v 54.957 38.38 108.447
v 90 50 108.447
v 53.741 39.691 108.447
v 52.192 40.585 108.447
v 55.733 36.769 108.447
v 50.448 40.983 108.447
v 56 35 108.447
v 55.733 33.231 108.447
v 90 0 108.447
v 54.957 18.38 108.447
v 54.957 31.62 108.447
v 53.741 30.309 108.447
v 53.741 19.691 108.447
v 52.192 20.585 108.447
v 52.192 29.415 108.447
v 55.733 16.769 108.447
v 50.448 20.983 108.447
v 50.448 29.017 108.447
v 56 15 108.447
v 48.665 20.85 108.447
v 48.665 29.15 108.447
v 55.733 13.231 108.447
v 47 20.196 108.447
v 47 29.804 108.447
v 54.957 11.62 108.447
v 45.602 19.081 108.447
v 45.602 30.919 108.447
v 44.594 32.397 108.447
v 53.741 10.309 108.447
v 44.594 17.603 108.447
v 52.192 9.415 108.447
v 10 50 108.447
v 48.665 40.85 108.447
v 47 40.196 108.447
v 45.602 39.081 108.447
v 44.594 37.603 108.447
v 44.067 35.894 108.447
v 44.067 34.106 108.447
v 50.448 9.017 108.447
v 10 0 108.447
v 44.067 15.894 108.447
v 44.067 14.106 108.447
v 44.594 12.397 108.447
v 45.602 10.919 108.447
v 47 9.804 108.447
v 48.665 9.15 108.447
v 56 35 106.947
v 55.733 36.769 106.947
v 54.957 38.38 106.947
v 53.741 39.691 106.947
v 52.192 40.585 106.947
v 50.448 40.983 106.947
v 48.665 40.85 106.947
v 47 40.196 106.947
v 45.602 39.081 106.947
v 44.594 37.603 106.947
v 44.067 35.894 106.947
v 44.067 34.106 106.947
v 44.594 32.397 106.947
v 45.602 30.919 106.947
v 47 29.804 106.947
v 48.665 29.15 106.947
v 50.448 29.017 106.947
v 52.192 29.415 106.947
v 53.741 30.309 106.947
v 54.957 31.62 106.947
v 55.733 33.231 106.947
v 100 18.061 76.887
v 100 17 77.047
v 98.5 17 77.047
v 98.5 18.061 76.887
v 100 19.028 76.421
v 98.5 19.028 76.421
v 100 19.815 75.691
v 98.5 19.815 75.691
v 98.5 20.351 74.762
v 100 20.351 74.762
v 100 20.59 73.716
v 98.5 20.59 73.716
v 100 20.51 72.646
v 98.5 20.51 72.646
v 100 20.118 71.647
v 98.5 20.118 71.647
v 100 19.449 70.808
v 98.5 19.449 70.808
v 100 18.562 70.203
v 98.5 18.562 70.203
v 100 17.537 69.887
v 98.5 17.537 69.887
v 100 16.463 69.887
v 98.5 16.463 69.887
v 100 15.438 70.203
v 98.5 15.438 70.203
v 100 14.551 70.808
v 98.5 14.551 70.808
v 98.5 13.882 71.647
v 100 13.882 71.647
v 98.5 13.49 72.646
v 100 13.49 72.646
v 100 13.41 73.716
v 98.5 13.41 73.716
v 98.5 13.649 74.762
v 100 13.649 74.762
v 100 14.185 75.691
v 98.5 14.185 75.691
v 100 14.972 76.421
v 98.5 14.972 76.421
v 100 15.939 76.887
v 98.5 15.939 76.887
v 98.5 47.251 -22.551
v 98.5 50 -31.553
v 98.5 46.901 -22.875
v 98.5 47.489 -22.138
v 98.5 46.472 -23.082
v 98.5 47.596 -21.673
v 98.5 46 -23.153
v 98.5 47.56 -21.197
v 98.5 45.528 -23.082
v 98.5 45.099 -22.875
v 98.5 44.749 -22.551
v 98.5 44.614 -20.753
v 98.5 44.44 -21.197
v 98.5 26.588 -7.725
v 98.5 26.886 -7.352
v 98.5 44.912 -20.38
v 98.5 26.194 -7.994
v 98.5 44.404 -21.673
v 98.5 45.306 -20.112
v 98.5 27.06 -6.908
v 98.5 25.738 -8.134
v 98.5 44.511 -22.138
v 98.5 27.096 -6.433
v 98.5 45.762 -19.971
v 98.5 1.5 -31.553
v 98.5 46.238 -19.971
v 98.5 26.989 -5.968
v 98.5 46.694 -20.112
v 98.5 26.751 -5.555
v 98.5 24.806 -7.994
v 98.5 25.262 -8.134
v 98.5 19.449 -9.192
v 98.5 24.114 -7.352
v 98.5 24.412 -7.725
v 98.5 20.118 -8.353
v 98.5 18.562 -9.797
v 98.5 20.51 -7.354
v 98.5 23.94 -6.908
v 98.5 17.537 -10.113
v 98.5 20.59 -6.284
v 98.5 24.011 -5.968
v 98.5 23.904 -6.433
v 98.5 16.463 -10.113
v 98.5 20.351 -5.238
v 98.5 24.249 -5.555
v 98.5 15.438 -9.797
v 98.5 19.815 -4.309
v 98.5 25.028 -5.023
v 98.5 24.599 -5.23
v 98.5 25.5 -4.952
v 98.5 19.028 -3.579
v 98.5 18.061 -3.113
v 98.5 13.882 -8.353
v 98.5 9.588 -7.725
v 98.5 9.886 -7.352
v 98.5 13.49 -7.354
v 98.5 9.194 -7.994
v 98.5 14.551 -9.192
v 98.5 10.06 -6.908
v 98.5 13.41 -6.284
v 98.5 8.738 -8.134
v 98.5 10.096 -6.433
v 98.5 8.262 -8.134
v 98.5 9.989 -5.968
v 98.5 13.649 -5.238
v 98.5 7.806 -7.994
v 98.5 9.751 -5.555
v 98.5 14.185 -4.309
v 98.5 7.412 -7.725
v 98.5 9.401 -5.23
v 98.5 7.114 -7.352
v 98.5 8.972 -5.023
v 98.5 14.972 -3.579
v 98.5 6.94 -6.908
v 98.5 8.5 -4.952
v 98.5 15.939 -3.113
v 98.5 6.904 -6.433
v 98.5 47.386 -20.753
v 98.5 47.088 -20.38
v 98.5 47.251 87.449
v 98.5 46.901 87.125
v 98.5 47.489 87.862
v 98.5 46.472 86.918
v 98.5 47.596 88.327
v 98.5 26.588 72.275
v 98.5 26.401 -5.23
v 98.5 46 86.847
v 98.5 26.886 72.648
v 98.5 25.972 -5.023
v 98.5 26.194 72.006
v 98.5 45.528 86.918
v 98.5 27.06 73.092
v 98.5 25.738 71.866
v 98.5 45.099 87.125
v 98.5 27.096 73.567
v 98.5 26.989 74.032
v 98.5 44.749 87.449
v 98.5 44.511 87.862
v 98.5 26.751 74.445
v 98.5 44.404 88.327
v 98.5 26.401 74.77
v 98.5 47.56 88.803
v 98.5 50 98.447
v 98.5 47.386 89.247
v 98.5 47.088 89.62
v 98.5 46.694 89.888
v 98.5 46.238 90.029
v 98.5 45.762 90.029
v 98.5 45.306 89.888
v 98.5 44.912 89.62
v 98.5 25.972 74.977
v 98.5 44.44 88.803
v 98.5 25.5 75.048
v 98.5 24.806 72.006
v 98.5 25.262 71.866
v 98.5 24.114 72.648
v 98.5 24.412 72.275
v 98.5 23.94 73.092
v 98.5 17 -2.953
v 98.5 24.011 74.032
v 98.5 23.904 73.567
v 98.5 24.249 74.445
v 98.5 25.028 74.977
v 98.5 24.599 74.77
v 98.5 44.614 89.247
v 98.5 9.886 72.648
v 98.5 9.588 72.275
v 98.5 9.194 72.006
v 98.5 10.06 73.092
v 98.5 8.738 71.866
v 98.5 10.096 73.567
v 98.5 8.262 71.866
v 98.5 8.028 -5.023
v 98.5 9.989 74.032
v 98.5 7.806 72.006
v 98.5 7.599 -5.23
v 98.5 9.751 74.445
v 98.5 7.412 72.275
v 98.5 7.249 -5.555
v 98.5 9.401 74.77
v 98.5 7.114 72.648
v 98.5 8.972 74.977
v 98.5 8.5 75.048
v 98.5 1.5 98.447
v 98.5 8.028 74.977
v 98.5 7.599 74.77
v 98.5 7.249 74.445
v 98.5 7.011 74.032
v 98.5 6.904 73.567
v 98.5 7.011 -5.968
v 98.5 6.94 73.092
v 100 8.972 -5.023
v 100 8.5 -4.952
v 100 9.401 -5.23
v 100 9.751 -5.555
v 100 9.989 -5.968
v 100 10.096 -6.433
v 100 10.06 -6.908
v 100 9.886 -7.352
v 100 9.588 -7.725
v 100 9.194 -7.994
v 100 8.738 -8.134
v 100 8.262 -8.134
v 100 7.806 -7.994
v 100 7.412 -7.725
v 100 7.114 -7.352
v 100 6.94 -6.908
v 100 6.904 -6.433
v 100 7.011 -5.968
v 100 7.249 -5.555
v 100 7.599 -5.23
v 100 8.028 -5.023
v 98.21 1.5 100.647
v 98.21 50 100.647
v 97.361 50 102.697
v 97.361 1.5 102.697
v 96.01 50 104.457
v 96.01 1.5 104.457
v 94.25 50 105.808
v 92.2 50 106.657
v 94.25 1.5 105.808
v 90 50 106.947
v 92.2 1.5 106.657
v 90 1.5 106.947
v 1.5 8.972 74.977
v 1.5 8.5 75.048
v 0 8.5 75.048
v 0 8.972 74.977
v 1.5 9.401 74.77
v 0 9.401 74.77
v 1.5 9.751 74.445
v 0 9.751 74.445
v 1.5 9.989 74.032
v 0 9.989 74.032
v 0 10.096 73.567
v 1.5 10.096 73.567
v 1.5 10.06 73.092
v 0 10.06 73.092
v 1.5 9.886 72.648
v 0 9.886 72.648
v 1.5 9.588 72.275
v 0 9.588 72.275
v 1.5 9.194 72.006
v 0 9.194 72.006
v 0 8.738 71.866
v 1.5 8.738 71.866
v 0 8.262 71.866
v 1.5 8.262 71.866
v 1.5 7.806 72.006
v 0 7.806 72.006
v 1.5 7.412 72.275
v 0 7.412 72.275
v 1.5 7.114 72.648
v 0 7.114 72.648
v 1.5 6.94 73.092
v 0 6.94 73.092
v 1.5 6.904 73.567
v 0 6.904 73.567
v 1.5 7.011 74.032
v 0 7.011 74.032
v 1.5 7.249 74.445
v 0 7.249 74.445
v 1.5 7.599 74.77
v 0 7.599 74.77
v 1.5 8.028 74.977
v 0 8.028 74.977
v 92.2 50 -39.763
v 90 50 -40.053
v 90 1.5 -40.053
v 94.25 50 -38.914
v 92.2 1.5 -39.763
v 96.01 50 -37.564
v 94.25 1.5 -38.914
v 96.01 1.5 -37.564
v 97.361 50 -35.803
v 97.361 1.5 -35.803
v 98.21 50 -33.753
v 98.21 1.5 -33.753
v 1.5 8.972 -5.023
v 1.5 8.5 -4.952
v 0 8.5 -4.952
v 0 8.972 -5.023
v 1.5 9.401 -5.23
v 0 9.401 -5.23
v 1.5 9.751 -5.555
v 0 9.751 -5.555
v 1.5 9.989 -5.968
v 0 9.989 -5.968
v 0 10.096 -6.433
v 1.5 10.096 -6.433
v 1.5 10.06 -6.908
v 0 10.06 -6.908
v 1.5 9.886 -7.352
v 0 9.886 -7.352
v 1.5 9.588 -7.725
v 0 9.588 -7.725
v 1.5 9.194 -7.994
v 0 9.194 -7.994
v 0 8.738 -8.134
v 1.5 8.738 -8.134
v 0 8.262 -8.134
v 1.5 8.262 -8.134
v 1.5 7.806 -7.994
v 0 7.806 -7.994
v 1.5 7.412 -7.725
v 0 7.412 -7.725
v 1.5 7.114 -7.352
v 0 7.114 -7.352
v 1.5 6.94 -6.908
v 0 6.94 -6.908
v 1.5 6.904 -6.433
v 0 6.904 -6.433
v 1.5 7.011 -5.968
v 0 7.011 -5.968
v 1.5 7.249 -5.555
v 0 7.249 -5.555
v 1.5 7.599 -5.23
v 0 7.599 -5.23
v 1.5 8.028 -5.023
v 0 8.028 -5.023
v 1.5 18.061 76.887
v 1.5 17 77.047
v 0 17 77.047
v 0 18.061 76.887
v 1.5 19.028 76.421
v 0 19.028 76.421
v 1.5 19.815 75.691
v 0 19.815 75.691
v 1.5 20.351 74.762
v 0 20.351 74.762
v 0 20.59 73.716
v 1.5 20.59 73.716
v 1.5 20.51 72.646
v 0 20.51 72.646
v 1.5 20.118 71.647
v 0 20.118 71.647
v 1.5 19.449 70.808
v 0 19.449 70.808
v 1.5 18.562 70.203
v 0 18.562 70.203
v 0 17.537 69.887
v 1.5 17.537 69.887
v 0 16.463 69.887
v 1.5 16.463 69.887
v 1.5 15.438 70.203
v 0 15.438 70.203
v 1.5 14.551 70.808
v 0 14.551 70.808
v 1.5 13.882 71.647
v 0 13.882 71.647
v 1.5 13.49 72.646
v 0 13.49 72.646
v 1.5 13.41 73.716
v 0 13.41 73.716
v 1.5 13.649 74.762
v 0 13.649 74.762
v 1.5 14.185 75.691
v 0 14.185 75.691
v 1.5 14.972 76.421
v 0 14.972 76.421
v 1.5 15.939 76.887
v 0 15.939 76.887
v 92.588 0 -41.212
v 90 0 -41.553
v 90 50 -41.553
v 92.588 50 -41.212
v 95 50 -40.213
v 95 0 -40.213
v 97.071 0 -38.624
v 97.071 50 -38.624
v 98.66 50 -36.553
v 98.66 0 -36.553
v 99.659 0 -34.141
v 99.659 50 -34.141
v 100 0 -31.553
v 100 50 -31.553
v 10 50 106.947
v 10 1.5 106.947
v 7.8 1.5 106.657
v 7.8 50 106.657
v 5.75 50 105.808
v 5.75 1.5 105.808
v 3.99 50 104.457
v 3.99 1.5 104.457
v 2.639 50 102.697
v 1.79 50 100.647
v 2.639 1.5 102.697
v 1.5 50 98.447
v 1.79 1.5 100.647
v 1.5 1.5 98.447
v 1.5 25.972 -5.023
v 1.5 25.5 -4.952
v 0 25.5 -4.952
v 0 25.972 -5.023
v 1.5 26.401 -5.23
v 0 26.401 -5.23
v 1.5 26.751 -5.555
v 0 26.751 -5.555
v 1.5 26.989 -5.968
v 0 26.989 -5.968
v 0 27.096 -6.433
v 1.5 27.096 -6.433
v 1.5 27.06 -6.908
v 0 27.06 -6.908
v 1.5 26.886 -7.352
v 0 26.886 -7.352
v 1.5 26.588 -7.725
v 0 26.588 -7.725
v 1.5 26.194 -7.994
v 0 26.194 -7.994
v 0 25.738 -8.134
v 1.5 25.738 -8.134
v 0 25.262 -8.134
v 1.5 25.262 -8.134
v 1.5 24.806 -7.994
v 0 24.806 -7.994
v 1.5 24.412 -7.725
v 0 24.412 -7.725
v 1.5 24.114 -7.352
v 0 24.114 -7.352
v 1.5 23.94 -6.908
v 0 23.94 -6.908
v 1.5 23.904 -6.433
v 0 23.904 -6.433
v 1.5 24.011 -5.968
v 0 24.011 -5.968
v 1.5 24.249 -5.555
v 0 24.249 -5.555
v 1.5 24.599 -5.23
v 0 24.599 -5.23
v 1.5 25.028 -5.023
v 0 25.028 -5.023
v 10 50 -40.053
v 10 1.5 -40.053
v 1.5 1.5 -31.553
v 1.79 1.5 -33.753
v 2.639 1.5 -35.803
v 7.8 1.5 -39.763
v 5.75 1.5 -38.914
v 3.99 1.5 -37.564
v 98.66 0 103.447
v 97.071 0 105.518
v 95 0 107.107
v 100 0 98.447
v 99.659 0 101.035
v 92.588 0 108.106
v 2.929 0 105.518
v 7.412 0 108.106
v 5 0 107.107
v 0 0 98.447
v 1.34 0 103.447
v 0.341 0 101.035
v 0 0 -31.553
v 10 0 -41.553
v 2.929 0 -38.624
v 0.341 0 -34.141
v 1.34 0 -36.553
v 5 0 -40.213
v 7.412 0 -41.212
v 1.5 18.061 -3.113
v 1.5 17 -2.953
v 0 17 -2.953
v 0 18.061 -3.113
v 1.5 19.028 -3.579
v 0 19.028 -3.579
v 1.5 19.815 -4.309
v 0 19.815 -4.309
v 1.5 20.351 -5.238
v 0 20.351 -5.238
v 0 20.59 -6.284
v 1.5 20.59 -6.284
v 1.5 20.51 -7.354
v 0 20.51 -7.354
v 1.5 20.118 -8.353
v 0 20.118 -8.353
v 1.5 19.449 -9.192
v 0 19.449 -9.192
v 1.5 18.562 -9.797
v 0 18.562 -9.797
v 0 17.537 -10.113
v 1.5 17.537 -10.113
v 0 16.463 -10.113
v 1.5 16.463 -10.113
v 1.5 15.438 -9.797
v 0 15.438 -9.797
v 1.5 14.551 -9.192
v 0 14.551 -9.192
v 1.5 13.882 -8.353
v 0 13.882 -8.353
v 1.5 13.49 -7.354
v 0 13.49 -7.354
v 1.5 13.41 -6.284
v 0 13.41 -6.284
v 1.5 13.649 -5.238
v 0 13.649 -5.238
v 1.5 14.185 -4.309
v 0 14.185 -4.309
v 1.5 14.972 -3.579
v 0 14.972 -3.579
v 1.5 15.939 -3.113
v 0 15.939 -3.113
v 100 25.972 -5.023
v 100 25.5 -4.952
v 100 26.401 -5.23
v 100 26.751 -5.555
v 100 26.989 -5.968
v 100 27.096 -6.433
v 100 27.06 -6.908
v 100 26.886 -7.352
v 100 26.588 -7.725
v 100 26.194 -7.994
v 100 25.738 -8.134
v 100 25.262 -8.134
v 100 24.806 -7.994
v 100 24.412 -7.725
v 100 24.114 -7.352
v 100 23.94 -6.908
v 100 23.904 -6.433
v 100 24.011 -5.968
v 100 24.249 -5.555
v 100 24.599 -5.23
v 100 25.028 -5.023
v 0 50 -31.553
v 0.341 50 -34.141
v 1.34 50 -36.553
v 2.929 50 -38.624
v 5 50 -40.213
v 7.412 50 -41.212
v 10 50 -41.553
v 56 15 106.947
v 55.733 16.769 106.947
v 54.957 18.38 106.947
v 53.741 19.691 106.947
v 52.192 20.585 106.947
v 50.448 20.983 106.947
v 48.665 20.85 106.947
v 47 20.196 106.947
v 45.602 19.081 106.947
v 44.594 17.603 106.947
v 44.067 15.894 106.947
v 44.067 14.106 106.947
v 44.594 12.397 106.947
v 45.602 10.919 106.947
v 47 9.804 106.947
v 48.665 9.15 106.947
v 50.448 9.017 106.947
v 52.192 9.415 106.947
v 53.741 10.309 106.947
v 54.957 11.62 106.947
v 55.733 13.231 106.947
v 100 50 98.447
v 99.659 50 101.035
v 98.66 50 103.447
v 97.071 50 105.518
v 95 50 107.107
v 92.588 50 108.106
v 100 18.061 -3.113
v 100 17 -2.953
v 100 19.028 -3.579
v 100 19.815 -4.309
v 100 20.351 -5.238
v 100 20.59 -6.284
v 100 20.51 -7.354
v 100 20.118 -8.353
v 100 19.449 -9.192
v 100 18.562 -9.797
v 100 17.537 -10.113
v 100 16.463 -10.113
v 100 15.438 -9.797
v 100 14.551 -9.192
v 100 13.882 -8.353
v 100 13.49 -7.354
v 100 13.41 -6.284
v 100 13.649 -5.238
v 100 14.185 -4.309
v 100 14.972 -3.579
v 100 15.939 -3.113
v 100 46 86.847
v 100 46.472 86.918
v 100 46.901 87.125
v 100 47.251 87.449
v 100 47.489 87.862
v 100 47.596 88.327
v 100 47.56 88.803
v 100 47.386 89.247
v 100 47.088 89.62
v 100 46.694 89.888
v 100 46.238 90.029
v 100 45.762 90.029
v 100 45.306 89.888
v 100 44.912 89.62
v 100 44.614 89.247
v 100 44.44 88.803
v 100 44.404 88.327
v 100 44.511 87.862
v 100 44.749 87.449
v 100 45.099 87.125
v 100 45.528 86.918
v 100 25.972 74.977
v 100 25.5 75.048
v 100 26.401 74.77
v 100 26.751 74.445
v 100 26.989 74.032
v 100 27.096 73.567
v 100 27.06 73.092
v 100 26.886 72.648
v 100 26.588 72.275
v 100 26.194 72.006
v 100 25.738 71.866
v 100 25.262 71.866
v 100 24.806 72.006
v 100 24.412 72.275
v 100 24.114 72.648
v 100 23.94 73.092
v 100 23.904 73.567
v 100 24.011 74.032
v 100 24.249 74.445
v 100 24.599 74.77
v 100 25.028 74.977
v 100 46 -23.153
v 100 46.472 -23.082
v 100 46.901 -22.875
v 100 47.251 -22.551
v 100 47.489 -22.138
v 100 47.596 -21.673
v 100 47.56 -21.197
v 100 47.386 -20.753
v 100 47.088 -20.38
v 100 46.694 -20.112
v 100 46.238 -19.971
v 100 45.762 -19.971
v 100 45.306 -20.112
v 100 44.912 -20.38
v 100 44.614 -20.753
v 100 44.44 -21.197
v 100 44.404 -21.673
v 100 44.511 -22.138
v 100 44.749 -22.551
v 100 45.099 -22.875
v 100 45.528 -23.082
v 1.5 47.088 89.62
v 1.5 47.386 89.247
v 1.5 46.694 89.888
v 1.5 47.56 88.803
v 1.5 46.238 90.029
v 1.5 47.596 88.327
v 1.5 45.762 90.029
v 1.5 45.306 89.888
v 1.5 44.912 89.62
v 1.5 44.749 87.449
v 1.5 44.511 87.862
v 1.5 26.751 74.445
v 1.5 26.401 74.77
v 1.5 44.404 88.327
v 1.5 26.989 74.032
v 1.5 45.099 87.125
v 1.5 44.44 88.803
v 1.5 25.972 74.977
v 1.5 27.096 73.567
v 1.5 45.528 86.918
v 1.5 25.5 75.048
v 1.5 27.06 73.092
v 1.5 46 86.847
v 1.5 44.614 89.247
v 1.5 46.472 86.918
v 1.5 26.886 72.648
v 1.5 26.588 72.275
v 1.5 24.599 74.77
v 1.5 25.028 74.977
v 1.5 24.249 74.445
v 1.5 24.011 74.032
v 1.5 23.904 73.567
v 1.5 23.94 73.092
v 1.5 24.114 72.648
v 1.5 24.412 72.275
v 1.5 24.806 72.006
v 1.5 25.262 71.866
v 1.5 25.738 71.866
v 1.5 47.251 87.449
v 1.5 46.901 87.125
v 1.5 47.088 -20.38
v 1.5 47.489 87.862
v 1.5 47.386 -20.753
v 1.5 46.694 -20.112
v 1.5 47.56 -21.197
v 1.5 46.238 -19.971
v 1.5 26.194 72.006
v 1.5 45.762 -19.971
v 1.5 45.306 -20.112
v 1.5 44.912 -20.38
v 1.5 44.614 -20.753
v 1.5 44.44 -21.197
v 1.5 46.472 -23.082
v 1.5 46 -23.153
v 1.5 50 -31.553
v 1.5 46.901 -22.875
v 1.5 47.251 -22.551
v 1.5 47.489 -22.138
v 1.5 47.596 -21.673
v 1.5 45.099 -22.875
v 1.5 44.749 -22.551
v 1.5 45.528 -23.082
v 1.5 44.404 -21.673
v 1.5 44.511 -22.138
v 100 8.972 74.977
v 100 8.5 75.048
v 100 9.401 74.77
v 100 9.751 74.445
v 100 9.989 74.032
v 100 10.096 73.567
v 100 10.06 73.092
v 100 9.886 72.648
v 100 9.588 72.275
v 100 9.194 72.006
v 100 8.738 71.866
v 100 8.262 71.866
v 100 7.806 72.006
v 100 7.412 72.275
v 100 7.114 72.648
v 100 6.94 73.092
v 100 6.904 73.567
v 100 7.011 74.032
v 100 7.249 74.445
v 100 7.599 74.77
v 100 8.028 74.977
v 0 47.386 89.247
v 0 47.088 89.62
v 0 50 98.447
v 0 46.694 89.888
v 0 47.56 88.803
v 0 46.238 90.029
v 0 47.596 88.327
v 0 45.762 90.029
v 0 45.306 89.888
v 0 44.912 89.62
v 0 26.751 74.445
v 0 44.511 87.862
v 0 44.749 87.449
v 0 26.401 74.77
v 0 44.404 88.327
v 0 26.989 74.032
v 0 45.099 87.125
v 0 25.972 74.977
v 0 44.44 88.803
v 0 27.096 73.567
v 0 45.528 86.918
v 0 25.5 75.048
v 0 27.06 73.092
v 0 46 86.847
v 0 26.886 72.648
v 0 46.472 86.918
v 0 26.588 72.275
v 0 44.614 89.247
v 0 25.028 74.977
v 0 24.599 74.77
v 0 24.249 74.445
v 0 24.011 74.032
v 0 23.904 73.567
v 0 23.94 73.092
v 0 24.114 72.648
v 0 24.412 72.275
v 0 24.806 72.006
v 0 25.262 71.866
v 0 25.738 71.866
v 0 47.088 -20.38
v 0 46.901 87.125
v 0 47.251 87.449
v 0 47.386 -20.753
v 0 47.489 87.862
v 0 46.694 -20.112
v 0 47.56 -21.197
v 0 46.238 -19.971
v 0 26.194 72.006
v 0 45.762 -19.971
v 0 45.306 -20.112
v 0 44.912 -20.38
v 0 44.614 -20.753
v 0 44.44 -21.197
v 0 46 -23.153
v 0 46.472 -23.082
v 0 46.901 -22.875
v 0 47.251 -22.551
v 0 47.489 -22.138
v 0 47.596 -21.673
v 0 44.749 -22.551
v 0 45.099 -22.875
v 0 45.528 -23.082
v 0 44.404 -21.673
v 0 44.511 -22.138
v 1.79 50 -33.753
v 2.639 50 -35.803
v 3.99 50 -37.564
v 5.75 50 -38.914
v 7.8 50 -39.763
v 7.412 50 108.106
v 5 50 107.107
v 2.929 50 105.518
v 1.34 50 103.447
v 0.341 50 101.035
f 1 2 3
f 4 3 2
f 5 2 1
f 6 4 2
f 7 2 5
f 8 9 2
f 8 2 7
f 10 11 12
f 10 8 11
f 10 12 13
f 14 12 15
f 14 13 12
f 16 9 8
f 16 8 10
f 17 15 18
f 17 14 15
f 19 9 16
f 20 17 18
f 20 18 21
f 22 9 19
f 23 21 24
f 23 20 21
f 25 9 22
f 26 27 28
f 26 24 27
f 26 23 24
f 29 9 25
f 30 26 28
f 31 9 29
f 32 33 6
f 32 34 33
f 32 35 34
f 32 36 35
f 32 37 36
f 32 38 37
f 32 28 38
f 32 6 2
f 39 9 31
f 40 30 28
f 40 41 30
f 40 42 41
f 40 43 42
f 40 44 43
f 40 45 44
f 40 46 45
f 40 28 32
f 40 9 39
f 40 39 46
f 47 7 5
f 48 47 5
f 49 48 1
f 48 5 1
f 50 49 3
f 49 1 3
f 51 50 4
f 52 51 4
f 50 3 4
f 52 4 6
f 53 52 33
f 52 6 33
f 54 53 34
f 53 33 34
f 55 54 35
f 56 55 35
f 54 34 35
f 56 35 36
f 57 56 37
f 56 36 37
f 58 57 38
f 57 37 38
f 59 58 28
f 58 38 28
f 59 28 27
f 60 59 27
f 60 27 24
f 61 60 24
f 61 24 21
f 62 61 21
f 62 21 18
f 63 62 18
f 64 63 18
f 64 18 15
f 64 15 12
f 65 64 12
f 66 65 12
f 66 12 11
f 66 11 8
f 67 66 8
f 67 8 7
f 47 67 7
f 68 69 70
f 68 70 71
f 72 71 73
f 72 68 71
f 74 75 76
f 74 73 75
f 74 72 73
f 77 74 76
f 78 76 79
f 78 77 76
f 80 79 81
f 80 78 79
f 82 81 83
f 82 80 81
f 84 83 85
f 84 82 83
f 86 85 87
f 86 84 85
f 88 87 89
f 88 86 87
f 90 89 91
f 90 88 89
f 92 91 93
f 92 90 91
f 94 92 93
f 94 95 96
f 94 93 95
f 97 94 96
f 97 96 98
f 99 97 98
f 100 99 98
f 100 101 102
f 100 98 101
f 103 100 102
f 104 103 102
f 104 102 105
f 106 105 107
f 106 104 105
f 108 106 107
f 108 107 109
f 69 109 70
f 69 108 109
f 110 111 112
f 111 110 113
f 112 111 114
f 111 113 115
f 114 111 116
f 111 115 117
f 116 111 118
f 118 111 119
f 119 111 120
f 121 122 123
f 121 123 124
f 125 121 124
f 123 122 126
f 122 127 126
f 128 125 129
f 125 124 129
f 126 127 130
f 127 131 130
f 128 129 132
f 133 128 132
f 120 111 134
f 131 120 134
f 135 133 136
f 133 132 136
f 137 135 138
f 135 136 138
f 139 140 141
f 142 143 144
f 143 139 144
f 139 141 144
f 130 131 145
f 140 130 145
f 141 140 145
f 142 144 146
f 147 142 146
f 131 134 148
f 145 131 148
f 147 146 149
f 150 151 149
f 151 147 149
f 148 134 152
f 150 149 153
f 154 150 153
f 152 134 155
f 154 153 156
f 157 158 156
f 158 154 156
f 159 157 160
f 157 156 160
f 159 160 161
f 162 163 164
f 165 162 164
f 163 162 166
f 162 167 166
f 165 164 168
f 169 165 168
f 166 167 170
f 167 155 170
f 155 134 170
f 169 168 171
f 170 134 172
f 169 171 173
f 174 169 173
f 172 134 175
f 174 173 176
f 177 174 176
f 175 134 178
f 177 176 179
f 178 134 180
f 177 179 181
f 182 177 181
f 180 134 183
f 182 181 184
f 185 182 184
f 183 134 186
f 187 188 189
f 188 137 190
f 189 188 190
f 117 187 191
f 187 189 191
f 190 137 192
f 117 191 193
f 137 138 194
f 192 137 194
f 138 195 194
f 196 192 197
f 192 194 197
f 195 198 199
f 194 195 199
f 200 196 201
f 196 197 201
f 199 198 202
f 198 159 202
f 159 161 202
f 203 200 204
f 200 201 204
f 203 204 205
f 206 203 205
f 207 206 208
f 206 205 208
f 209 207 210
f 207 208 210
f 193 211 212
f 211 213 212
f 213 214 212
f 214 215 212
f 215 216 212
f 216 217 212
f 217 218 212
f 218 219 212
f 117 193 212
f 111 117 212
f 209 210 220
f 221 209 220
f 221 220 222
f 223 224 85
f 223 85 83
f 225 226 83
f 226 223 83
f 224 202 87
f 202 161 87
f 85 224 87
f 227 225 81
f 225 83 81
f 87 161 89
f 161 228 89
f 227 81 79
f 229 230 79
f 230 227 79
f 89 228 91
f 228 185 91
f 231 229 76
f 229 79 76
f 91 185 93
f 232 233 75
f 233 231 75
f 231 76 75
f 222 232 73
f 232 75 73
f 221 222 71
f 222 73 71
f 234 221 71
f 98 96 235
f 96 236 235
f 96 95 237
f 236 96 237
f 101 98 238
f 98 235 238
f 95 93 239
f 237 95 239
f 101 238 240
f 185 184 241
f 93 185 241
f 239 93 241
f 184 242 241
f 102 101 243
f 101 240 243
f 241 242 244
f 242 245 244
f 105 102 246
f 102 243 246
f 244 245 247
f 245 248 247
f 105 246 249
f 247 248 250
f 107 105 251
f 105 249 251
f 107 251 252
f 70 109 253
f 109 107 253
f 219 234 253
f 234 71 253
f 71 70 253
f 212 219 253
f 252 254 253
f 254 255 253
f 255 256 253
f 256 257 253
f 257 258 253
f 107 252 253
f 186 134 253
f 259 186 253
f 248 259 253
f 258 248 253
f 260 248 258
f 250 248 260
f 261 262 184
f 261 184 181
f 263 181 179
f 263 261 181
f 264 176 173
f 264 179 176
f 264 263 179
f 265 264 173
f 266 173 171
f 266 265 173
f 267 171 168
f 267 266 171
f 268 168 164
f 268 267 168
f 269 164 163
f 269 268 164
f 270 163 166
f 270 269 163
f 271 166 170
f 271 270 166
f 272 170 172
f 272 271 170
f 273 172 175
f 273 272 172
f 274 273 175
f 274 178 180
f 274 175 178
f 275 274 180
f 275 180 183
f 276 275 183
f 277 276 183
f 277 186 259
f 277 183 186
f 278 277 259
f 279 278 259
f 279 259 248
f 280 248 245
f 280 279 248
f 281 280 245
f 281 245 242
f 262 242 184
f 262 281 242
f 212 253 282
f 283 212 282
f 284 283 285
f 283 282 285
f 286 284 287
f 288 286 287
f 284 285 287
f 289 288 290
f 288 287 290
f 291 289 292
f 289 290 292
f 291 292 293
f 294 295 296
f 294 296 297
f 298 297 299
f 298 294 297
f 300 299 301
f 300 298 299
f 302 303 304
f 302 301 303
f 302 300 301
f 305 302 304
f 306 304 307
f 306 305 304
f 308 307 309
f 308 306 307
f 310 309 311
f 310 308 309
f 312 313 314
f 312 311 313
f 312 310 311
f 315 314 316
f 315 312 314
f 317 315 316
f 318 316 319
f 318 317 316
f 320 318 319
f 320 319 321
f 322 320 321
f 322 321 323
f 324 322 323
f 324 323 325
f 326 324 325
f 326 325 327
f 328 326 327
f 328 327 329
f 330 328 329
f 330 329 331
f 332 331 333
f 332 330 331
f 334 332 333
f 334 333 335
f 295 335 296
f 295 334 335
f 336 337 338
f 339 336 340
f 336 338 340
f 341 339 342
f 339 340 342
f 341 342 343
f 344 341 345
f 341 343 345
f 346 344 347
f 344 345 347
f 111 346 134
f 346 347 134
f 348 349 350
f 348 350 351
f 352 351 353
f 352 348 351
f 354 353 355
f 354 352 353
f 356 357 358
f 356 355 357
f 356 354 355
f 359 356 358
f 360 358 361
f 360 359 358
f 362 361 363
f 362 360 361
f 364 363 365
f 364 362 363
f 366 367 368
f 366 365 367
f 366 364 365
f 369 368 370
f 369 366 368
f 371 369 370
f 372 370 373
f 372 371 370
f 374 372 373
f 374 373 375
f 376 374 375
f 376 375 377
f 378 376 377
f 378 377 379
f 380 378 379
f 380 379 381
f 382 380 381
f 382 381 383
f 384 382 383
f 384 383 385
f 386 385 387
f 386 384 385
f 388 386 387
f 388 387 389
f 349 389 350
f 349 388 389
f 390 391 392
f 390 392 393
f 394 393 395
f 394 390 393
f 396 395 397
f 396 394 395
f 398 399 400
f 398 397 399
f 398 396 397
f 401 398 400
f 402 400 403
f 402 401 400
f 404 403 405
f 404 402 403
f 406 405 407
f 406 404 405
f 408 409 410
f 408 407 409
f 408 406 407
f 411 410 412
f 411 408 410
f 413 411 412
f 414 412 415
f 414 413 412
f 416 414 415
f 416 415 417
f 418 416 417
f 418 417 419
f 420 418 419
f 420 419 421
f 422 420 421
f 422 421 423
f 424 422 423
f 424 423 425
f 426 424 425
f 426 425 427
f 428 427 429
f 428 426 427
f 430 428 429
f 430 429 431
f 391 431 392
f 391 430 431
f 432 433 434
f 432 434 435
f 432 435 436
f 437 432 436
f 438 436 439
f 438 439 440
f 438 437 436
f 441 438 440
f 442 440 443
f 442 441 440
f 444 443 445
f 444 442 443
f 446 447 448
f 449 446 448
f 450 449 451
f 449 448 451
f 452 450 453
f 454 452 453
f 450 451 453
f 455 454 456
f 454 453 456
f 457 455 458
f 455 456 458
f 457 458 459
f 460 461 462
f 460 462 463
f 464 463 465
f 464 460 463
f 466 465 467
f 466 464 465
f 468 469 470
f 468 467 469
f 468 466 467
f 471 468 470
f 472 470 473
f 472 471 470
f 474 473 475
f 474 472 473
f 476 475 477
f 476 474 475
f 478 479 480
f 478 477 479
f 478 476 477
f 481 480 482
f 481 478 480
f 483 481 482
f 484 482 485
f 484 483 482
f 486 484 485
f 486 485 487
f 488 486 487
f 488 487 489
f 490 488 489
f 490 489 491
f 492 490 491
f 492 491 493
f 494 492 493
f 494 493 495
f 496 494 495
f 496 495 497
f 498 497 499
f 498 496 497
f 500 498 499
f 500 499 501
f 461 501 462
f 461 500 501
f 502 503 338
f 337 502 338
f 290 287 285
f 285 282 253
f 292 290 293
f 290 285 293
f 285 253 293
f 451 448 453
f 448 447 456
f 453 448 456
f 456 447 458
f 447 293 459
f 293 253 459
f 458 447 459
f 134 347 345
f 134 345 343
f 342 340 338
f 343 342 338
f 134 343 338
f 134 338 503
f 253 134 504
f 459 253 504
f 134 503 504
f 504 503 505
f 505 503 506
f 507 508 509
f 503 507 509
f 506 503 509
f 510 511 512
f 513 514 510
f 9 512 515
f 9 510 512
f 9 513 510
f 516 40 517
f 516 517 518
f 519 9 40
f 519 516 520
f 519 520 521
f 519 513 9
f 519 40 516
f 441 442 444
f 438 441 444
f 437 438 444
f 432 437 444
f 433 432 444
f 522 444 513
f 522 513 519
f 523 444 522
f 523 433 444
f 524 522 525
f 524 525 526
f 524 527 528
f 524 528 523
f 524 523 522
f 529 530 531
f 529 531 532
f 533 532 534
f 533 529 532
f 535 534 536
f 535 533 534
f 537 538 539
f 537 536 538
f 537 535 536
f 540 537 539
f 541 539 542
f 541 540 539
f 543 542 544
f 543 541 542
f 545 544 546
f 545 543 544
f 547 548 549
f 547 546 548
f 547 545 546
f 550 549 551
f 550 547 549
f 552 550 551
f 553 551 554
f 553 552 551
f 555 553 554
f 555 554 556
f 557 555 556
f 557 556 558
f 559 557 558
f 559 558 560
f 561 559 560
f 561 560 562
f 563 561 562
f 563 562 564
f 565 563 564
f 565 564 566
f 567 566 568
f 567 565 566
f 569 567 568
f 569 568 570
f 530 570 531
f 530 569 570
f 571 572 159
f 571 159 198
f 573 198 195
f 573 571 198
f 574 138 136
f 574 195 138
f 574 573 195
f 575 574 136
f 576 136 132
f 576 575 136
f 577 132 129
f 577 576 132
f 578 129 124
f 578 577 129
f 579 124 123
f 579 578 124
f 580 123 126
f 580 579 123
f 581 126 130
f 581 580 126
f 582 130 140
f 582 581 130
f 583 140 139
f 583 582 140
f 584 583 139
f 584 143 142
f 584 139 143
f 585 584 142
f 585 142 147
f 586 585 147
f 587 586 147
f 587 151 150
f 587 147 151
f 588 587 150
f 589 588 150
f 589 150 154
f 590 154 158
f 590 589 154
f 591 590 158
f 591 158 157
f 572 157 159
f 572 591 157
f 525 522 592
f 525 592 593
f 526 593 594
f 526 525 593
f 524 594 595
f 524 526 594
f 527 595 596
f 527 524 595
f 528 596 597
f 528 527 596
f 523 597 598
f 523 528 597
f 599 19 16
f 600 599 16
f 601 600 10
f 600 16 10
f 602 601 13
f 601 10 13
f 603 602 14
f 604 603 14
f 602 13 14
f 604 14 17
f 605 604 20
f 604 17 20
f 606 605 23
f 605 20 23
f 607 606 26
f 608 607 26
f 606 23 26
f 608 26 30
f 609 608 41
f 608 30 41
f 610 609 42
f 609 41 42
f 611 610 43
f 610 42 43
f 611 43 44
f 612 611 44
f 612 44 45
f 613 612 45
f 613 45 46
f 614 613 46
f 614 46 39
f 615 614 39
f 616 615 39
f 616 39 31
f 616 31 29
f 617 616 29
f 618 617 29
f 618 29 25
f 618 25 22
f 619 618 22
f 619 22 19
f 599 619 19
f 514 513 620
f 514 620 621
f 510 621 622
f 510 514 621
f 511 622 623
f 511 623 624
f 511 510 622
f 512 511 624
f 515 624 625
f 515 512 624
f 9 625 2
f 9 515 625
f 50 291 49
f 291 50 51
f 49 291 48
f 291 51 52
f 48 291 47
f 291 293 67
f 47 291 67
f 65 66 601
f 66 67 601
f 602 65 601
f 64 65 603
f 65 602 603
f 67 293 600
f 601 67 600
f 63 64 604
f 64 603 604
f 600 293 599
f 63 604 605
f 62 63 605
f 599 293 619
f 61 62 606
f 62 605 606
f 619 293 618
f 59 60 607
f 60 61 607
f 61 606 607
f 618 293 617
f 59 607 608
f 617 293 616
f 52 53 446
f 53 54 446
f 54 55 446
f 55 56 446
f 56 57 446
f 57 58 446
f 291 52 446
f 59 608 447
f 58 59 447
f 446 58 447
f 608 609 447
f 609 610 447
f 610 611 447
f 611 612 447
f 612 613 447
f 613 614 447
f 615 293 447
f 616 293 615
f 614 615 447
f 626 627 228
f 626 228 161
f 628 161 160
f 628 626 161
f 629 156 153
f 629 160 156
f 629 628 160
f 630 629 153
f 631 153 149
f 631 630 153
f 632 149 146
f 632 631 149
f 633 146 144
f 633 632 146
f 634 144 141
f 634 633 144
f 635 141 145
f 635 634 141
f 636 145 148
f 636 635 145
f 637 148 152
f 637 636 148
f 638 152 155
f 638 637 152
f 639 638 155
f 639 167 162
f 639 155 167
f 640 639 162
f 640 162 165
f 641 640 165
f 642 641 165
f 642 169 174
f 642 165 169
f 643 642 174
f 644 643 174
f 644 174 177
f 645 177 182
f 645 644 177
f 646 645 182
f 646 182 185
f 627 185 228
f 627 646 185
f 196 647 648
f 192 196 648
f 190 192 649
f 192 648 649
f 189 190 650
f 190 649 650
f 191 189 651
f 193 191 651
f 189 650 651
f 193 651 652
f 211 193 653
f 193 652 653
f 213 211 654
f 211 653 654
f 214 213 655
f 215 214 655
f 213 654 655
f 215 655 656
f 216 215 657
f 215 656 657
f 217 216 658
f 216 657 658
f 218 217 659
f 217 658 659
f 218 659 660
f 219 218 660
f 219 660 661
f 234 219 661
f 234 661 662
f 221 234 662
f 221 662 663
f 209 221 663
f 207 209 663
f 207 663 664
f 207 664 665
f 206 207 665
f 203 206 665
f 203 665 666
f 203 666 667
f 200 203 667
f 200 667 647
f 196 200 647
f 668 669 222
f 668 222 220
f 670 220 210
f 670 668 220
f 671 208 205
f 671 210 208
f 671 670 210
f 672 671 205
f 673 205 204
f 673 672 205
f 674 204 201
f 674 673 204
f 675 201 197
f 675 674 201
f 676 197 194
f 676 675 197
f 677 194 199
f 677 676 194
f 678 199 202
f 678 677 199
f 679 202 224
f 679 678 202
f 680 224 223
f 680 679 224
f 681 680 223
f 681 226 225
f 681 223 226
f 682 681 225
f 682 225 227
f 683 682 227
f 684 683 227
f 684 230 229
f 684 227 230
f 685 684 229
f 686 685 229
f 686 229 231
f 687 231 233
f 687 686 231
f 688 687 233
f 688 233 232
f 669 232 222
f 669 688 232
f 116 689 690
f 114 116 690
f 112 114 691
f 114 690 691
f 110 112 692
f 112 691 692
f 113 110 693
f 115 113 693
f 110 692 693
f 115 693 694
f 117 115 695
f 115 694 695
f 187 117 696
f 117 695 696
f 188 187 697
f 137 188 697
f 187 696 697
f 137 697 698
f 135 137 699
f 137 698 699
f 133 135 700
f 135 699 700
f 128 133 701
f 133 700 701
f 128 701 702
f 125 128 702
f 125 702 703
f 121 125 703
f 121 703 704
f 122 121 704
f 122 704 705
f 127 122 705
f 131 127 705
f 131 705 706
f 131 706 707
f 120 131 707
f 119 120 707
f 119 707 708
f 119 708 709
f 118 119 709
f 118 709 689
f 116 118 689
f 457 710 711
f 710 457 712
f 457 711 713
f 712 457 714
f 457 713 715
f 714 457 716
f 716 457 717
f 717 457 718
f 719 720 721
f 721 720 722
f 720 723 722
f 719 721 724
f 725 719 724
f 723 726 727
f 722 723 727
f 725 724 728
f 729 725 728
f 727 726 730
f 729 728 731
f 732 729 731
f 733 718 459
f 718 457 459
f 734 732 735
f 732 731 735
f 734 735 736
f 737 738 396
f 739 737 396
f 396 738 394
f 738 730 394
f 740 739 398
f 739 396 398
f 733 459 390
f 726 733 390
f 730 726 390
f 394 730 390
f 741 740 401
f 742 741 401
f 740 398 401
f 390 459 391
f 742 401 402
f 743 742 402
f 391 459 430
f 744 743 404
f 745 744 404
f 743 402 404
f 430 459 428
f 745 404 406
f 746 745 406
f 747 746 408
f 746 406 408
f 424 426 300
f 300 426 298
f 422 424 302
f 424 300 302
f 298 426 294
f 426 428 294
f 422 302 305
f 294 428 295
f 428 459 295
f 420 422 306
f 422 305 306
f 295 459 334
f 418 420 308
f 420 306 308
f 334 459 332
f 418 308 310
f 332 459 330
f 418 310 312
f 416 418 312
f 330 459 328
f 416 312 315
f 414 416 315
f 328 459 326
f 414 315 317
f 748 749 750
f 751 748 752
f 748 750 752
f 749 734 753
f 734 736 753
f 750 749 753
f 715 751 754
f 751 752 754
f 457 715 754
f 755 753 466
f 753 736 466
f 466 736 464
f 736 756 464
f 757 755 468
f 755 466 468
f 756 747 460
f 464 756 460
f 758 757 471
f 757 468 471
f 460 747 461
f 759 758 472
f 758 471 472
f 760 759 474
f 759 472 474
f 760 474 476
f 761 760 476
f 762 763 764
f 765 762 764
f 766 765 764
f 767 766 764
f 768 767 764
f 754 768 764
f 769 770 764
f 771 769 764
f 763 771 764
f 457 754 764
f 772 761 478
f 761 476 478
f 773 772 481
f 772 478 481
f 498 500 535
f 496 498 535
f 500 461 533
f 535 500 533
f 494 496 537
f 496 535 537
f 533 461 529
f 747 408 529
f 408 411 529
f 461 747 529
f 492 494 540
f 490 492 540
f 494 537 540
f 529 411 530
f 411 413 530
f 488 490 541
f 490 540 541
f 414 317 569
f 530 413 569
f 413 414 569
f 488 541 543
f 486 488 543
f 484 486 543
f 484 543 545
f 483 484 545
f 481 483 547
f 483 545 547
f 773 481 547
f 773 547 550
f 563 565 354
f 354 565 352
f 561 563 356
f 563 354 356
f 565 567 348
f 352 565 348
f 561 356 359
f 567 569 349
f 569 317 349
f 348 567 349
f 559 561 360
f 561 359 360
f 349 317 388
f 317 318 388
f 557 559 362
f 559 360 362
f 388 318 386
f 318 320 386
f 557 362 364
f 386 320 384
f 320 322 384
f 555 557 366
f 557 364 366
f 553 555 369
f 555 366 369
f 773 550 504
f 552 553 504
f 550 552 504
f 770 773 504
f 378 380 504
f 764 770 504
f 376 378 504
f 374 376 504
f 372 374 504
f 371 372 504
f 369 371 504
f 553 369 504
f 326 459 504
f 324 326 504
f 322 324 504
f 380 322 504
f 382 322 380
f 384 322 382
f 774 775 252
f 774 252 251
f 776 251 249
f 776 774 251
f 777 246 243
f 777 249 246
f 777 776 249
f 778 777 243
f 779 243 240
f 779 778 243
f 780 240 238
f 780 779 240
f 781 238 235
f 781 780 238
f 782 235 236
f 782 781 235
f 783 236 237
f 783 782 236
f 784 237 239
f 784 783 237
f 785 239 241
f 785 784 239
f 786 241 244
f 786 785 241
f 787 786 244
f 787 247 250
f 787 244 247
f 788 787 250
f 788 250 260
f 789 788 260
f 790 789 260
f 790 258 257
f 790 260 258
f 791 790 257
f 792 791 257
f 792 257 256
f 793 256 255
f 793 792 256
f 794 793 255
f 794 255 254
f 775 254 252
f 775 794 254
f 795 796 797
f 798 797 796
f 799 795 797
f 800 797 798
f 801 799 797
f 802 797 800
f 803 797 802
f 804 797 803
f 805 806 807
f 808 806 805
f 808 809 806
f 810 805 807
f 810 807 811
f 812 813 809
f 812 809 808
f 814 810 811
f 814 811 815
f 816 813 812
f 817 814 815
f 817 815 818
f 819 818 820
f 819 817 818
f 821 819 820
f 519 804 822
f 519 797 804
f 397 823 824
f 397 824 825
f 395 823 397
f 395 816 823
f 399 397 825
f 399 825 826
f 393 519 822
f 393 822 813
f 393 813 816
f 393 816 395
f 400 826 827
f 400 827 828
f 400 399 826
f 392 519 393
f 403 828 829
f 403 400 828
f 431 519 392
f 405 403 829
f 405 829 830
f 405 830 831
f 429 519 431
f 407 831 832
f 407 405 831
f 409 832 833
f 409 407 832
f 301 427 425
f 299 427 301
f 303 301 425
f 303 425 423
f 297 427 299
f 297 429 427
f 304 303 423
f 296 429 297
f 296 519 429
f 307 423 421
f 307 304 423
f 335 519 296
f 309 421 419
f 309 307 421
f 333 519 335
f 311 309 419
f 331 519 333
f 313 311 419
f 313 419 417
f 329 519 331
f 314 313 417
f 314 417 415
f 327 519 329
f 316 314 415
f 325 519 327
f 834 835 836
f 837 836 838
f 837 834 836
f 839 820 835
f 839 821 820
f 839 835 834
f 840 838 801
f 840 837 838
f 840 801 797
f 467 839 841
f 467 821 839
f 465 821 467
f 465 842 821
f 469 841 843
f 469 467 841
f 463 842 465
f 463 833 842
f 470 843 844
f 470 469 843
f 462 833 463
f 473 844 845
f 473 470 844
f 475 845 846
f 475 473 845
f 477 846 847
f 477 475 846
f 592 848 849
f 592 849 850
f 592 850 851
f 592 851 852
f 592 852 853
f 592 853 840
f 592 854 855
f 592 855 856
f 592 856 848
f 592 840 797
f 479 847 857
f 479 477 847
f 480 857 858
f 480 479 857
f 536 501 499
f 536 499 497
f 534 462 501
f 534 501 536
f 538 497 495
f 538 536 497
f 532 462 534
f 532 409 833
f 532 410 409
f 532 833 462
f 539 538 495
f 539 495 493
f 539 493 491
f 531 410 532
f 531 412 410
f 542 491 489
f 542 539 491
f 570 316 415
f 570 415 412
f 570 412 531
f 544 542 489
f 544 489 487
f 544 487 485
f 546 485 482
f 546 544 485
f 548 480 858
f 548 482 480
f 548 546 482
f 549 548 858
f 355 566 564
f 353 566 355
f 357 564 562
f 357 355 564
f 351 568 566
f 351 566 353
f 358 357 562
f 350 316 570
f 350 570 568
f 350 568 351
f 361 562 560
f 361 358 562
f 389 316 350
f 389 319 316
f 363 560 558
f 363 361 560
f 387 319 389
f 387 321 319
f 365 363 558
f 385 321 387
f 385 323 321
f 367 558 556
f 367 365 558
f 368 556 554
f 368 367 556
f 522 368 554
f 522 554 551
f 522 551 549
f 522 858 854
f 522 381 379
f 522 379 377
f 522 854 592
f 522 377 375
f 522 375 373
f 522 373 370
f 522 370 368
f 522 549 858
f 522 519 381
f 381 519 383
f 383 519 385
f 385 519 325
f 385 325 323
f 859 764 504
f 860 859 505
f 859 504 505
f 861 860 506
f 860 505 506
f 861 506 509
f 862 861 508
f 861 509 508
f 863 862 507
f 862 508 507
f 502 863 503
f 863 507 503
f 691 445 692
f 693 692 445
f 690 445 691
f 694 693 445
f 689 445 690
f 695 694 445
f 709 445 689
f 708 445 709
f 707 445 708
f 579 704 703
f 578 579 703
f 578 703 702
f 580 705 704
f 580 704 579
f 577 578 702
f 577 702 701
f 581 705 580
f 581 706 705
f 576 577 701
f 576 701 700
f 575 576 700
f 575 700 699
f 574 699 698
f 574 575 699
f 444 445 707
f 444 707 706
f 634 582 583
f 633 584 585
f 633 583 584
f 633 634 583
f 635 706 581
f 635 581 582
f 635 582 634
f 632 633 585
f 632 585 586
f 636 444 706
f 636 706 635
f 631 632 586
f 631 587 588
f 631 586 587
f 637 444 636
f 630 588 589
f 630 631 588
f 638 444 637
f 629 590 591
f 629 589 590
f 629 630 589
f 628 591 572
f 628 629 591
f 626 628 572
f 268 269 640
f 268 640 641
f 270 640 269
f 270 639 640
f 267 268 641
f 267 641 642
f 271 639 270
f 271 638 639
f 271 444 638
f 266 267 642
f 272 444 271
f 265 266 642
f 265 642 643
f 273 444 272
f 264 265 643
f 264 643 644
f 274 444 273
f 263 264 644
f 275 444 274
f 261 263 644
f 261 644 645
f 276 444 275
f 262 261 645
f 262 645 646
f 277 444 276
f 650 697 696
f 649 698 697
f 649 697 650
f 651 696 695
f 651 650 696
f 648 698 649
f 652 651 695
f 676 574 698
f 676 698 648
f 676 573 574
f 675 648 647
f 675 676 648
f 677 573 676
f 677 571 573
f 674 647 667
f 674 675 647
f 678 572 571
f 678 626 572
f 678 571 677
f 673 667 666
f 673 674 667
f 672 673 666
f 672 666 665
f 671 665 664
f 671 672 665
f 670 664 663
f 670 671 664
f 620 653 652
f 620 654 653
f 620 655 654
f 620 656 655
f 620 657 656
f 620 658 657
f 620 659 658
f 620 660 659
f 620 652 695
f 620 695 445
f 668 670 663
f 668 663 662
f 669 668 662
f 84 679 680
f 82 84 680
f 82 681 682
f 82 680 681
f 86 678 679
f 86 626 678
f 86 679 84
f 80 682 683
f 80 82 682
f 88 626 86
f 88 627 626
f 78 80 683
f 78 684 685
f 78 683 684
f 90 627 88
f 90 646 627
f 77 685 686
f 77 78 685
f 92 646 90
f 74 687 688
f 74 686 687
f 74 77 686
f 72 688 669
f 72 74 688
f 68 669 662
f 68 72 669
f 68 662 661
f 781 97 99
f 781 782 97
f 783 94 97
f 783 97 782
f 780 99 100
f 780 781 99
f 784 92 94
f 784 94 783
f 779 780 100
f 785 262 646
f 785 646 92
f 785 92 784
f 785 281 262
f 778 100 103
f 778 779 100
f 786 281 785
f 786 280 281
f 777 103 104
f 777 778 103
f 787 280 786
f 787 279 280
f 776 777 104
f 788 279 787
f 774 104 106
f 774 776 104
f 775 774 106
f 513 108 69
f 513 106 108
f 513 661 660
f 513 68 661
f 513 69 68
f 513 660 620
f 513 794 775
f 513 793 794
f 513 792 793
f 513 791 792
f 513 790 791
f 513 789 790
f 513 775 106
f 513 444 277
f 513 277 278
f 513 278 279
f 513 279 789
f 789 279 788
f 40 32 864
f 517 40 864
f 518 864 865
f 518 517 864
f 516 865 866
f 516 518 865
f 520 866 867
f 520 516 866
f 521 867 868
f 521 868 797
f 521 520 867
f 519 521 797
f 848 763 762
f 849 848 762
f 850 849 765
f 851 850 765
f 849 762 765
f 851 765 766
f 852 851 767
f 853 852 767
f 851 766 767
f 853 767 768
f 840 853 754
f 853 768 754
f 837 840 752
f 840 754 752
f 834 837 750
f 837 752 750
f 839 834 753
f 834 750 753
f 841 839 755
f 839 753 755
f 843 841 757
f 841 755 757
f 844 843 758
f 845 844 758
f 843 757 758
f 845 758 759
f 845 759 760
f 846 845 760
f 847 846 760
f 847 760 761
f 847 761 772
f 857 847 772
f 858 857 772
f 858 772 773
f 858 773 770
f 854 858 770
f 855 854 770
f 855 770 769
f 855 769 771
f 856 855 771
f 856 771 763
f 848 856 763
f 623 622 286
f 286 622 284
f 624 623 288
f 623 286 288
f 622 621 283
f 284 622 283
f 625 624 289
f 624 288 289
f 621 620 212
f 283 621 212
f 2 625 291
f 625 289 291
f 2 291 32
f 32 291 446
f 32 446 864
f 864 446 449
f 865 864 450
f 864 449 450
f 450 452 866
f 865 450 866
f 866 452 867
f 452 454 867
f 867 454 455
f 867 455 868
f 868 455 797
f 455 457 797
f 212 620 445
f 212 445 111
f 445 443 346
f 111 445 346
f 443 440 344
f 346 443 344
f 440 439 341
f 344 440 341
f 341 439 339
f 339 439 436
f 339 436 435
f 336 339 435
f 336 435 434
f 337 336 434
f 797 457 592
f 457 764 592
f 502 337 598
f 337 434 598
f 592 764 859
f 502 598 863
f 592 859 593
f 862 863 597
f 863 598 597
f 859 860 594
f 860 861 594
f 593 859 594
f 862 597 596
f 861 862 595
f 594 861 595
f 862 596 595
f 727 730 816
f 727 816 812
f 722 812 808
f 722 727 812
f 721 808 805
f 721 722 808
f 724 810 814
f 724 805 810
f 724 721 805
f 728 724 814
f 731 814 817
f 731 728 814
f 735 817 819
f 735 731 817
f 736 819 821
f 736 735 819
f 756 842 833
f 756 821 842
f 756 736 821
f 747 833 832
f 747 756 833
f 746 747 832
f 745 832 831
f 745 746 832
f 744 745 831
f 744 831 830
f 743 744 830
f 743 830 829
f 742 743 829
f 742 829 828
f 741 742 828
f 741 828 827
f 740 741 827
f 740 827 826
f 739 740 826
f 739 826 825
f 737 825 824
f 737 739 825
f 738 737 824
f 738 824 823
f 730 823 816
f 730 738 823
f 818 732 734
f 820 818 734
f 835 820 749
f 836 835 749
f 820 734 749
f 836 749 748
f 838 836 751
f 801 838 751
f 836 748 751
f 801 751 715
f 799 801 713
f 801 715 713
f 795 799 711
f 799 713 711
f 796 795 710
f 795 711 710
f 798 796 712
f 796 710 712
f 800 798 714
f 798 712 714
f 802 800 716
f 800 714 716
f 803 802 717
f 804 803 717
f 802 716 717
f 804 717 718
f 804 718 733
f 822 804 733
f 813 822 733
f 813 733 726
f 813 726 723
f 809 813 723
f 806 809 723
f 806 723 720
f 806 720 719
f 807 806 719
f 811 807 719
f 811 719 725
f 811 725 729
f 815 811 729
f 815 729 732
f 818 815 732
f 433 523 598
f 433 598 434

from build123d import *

# Parameters (mm, degrees)
EXTRUDE_1_DEPTH          = 50
SHELL_1_T                = -1.5
CUT_EXTRUDE_1_DEPTH      = 156.758548301
CUT_EXTRUDE_1_DEPTH_BACK = 156.758548301
SKETCH_4_R               = 3.6
SKETCH_4_R_2             = 1.6
CUT_EXTRUDE_2_REACH      = 189.083
SKETCH_6_R               = 6
SKETCH_7_R               = 1.6
CUT_EXTRUDE_3_DEPTH      = 156.758548301


with BuildPart() as part:
    # 草圖3 → 填料-伸長1 (new body)
    with BuildSketch(Plane(origin=(0, 0, 0), x_dir=(1, 0, 0), z_dir=(0, 1, 0))):
        with BuildLine():
            Line((10, 41.553121903), (90, 41.553121903))
            ThreePointArc((90, 41.553121903), (97.071067812, 38.624189715), (100, 31.553121903))
            Line((100, 31.553121903), (100, -98.446878097))
            ThreePointArc((100, -98.446878097), (97.071067812, -105.517945908), (90, -108.446878097))
            Line((90, -108.446878097), (10, -108.446878097))
            ThreePointArc((10, -108.446878097), (2.928932188, -105.517945908), (0, -98.446878097))
            Line((0, -98.446878097), (0, 31.553121903))
            ThreePointArc((0, 31.553121903), (2.928932188, 38.624189715), (10, 41.553121903))
        make_face()
    extrude(amount=EXTRUDE_1_DEPTH)

    # 薄殼1
    shell_1_openings = [part.faces().sort_by_distance(p)[0] for p in [
        (50, 50, 33.446878097),
    ]]
    offset(amount=SHELL_1_T, openings=shell_1_openings, kind=Kind.INTERSECTION)

    # 草圖4 → 除料-伸長1 (cut, two sides: drawn at the far end of the back side and taken through both)
    with BuildSketch(Plane.ZY.offset(-CUT_EXTRUDE_1_DEPTH_BACK)):
        with Locations((-6.553121903, 17)):
            Circle(SKETCH_4_R)
        with Locations((73.446878097, 17)):
            Circle(SKETCH_4_R)
        with Locations((-6.552300072, 25.5)):
            Circle(SKETCH_4_R_2)
        with Locations((-6.552300072, 8.5)):
            Circle(SKETCH_4_R_2)
        with Locations((73.447699928, 25.5)):
            Circle(SKETCH_4_R_2)
        with Locations((73.447699928, 8.5)):
            Circle(SKETCH_4_R_2)
    extrude(amount=CUT_EXTRUDE_1_DEPTH + CUT_EXTRUDE_1_DEPTH_BACK, mode=Mode.SUBTRACT)

    # 草圖6 → 除料-伸長2 (cut, up to next)
    with BuildSketch(Plane.XY.offset(108.446878097), mode=Mode.PRIVATE) as cut_extrude_2_sk1:
        with Locations((50, 35)):
            Circle(SKETCH_6_R)
    cut_extrude_2_tool1 = extrude(cut_extrude_2_sk1.sketch, amount=-CUT_EXTRUDE_2_REACH, mode=Mode.PRIVATE) & part.part
    # 草圖6 → 除料-伸長2 (cut, up to next)
    with BuildSketch(Plane.XY.offset(108.446878097), mode=Mode.PRIVATE) as cut_extrude_2_sk2:
        with Locations((50, 15)):
            Circle(SKETCH_6_R)
    cut_extrude_2_tool2 = extrude(cut_extrude_2_sk2.sketch, amount=-CUT_EXTRUDE_2_REACH, mode=Mode.PRIVATE) & part.part
    add(cut_extrude_2_tool1.solids().sort_by_distance((50, 35, 108.446878))[0], mode=Mode.SUBTRACT)
    add(cut_extrude_2_tool2.solids().sort_by_distance((50, 15, 108.446878))[0], mode=Mode.SUBTRACT)

    # 草圖7 → 除料-伸長3 (cut, through all)
    with BuildSketch(Plane(origin=(100, 0, 0), x_dir=(0, 0, -1), z_dir=(1, 0, 0))):
        with Locations((-88.446878097, 46)):
            Circle(SKETCH_7_R)
        with Locations((21.553121903, 46)):
            Circle(SKETCH_7_R)
    extrude(amount=-CUT_EXTRUDE_3_DEPTH, mode=Mode.SUBTRACT)


solid = part.part
